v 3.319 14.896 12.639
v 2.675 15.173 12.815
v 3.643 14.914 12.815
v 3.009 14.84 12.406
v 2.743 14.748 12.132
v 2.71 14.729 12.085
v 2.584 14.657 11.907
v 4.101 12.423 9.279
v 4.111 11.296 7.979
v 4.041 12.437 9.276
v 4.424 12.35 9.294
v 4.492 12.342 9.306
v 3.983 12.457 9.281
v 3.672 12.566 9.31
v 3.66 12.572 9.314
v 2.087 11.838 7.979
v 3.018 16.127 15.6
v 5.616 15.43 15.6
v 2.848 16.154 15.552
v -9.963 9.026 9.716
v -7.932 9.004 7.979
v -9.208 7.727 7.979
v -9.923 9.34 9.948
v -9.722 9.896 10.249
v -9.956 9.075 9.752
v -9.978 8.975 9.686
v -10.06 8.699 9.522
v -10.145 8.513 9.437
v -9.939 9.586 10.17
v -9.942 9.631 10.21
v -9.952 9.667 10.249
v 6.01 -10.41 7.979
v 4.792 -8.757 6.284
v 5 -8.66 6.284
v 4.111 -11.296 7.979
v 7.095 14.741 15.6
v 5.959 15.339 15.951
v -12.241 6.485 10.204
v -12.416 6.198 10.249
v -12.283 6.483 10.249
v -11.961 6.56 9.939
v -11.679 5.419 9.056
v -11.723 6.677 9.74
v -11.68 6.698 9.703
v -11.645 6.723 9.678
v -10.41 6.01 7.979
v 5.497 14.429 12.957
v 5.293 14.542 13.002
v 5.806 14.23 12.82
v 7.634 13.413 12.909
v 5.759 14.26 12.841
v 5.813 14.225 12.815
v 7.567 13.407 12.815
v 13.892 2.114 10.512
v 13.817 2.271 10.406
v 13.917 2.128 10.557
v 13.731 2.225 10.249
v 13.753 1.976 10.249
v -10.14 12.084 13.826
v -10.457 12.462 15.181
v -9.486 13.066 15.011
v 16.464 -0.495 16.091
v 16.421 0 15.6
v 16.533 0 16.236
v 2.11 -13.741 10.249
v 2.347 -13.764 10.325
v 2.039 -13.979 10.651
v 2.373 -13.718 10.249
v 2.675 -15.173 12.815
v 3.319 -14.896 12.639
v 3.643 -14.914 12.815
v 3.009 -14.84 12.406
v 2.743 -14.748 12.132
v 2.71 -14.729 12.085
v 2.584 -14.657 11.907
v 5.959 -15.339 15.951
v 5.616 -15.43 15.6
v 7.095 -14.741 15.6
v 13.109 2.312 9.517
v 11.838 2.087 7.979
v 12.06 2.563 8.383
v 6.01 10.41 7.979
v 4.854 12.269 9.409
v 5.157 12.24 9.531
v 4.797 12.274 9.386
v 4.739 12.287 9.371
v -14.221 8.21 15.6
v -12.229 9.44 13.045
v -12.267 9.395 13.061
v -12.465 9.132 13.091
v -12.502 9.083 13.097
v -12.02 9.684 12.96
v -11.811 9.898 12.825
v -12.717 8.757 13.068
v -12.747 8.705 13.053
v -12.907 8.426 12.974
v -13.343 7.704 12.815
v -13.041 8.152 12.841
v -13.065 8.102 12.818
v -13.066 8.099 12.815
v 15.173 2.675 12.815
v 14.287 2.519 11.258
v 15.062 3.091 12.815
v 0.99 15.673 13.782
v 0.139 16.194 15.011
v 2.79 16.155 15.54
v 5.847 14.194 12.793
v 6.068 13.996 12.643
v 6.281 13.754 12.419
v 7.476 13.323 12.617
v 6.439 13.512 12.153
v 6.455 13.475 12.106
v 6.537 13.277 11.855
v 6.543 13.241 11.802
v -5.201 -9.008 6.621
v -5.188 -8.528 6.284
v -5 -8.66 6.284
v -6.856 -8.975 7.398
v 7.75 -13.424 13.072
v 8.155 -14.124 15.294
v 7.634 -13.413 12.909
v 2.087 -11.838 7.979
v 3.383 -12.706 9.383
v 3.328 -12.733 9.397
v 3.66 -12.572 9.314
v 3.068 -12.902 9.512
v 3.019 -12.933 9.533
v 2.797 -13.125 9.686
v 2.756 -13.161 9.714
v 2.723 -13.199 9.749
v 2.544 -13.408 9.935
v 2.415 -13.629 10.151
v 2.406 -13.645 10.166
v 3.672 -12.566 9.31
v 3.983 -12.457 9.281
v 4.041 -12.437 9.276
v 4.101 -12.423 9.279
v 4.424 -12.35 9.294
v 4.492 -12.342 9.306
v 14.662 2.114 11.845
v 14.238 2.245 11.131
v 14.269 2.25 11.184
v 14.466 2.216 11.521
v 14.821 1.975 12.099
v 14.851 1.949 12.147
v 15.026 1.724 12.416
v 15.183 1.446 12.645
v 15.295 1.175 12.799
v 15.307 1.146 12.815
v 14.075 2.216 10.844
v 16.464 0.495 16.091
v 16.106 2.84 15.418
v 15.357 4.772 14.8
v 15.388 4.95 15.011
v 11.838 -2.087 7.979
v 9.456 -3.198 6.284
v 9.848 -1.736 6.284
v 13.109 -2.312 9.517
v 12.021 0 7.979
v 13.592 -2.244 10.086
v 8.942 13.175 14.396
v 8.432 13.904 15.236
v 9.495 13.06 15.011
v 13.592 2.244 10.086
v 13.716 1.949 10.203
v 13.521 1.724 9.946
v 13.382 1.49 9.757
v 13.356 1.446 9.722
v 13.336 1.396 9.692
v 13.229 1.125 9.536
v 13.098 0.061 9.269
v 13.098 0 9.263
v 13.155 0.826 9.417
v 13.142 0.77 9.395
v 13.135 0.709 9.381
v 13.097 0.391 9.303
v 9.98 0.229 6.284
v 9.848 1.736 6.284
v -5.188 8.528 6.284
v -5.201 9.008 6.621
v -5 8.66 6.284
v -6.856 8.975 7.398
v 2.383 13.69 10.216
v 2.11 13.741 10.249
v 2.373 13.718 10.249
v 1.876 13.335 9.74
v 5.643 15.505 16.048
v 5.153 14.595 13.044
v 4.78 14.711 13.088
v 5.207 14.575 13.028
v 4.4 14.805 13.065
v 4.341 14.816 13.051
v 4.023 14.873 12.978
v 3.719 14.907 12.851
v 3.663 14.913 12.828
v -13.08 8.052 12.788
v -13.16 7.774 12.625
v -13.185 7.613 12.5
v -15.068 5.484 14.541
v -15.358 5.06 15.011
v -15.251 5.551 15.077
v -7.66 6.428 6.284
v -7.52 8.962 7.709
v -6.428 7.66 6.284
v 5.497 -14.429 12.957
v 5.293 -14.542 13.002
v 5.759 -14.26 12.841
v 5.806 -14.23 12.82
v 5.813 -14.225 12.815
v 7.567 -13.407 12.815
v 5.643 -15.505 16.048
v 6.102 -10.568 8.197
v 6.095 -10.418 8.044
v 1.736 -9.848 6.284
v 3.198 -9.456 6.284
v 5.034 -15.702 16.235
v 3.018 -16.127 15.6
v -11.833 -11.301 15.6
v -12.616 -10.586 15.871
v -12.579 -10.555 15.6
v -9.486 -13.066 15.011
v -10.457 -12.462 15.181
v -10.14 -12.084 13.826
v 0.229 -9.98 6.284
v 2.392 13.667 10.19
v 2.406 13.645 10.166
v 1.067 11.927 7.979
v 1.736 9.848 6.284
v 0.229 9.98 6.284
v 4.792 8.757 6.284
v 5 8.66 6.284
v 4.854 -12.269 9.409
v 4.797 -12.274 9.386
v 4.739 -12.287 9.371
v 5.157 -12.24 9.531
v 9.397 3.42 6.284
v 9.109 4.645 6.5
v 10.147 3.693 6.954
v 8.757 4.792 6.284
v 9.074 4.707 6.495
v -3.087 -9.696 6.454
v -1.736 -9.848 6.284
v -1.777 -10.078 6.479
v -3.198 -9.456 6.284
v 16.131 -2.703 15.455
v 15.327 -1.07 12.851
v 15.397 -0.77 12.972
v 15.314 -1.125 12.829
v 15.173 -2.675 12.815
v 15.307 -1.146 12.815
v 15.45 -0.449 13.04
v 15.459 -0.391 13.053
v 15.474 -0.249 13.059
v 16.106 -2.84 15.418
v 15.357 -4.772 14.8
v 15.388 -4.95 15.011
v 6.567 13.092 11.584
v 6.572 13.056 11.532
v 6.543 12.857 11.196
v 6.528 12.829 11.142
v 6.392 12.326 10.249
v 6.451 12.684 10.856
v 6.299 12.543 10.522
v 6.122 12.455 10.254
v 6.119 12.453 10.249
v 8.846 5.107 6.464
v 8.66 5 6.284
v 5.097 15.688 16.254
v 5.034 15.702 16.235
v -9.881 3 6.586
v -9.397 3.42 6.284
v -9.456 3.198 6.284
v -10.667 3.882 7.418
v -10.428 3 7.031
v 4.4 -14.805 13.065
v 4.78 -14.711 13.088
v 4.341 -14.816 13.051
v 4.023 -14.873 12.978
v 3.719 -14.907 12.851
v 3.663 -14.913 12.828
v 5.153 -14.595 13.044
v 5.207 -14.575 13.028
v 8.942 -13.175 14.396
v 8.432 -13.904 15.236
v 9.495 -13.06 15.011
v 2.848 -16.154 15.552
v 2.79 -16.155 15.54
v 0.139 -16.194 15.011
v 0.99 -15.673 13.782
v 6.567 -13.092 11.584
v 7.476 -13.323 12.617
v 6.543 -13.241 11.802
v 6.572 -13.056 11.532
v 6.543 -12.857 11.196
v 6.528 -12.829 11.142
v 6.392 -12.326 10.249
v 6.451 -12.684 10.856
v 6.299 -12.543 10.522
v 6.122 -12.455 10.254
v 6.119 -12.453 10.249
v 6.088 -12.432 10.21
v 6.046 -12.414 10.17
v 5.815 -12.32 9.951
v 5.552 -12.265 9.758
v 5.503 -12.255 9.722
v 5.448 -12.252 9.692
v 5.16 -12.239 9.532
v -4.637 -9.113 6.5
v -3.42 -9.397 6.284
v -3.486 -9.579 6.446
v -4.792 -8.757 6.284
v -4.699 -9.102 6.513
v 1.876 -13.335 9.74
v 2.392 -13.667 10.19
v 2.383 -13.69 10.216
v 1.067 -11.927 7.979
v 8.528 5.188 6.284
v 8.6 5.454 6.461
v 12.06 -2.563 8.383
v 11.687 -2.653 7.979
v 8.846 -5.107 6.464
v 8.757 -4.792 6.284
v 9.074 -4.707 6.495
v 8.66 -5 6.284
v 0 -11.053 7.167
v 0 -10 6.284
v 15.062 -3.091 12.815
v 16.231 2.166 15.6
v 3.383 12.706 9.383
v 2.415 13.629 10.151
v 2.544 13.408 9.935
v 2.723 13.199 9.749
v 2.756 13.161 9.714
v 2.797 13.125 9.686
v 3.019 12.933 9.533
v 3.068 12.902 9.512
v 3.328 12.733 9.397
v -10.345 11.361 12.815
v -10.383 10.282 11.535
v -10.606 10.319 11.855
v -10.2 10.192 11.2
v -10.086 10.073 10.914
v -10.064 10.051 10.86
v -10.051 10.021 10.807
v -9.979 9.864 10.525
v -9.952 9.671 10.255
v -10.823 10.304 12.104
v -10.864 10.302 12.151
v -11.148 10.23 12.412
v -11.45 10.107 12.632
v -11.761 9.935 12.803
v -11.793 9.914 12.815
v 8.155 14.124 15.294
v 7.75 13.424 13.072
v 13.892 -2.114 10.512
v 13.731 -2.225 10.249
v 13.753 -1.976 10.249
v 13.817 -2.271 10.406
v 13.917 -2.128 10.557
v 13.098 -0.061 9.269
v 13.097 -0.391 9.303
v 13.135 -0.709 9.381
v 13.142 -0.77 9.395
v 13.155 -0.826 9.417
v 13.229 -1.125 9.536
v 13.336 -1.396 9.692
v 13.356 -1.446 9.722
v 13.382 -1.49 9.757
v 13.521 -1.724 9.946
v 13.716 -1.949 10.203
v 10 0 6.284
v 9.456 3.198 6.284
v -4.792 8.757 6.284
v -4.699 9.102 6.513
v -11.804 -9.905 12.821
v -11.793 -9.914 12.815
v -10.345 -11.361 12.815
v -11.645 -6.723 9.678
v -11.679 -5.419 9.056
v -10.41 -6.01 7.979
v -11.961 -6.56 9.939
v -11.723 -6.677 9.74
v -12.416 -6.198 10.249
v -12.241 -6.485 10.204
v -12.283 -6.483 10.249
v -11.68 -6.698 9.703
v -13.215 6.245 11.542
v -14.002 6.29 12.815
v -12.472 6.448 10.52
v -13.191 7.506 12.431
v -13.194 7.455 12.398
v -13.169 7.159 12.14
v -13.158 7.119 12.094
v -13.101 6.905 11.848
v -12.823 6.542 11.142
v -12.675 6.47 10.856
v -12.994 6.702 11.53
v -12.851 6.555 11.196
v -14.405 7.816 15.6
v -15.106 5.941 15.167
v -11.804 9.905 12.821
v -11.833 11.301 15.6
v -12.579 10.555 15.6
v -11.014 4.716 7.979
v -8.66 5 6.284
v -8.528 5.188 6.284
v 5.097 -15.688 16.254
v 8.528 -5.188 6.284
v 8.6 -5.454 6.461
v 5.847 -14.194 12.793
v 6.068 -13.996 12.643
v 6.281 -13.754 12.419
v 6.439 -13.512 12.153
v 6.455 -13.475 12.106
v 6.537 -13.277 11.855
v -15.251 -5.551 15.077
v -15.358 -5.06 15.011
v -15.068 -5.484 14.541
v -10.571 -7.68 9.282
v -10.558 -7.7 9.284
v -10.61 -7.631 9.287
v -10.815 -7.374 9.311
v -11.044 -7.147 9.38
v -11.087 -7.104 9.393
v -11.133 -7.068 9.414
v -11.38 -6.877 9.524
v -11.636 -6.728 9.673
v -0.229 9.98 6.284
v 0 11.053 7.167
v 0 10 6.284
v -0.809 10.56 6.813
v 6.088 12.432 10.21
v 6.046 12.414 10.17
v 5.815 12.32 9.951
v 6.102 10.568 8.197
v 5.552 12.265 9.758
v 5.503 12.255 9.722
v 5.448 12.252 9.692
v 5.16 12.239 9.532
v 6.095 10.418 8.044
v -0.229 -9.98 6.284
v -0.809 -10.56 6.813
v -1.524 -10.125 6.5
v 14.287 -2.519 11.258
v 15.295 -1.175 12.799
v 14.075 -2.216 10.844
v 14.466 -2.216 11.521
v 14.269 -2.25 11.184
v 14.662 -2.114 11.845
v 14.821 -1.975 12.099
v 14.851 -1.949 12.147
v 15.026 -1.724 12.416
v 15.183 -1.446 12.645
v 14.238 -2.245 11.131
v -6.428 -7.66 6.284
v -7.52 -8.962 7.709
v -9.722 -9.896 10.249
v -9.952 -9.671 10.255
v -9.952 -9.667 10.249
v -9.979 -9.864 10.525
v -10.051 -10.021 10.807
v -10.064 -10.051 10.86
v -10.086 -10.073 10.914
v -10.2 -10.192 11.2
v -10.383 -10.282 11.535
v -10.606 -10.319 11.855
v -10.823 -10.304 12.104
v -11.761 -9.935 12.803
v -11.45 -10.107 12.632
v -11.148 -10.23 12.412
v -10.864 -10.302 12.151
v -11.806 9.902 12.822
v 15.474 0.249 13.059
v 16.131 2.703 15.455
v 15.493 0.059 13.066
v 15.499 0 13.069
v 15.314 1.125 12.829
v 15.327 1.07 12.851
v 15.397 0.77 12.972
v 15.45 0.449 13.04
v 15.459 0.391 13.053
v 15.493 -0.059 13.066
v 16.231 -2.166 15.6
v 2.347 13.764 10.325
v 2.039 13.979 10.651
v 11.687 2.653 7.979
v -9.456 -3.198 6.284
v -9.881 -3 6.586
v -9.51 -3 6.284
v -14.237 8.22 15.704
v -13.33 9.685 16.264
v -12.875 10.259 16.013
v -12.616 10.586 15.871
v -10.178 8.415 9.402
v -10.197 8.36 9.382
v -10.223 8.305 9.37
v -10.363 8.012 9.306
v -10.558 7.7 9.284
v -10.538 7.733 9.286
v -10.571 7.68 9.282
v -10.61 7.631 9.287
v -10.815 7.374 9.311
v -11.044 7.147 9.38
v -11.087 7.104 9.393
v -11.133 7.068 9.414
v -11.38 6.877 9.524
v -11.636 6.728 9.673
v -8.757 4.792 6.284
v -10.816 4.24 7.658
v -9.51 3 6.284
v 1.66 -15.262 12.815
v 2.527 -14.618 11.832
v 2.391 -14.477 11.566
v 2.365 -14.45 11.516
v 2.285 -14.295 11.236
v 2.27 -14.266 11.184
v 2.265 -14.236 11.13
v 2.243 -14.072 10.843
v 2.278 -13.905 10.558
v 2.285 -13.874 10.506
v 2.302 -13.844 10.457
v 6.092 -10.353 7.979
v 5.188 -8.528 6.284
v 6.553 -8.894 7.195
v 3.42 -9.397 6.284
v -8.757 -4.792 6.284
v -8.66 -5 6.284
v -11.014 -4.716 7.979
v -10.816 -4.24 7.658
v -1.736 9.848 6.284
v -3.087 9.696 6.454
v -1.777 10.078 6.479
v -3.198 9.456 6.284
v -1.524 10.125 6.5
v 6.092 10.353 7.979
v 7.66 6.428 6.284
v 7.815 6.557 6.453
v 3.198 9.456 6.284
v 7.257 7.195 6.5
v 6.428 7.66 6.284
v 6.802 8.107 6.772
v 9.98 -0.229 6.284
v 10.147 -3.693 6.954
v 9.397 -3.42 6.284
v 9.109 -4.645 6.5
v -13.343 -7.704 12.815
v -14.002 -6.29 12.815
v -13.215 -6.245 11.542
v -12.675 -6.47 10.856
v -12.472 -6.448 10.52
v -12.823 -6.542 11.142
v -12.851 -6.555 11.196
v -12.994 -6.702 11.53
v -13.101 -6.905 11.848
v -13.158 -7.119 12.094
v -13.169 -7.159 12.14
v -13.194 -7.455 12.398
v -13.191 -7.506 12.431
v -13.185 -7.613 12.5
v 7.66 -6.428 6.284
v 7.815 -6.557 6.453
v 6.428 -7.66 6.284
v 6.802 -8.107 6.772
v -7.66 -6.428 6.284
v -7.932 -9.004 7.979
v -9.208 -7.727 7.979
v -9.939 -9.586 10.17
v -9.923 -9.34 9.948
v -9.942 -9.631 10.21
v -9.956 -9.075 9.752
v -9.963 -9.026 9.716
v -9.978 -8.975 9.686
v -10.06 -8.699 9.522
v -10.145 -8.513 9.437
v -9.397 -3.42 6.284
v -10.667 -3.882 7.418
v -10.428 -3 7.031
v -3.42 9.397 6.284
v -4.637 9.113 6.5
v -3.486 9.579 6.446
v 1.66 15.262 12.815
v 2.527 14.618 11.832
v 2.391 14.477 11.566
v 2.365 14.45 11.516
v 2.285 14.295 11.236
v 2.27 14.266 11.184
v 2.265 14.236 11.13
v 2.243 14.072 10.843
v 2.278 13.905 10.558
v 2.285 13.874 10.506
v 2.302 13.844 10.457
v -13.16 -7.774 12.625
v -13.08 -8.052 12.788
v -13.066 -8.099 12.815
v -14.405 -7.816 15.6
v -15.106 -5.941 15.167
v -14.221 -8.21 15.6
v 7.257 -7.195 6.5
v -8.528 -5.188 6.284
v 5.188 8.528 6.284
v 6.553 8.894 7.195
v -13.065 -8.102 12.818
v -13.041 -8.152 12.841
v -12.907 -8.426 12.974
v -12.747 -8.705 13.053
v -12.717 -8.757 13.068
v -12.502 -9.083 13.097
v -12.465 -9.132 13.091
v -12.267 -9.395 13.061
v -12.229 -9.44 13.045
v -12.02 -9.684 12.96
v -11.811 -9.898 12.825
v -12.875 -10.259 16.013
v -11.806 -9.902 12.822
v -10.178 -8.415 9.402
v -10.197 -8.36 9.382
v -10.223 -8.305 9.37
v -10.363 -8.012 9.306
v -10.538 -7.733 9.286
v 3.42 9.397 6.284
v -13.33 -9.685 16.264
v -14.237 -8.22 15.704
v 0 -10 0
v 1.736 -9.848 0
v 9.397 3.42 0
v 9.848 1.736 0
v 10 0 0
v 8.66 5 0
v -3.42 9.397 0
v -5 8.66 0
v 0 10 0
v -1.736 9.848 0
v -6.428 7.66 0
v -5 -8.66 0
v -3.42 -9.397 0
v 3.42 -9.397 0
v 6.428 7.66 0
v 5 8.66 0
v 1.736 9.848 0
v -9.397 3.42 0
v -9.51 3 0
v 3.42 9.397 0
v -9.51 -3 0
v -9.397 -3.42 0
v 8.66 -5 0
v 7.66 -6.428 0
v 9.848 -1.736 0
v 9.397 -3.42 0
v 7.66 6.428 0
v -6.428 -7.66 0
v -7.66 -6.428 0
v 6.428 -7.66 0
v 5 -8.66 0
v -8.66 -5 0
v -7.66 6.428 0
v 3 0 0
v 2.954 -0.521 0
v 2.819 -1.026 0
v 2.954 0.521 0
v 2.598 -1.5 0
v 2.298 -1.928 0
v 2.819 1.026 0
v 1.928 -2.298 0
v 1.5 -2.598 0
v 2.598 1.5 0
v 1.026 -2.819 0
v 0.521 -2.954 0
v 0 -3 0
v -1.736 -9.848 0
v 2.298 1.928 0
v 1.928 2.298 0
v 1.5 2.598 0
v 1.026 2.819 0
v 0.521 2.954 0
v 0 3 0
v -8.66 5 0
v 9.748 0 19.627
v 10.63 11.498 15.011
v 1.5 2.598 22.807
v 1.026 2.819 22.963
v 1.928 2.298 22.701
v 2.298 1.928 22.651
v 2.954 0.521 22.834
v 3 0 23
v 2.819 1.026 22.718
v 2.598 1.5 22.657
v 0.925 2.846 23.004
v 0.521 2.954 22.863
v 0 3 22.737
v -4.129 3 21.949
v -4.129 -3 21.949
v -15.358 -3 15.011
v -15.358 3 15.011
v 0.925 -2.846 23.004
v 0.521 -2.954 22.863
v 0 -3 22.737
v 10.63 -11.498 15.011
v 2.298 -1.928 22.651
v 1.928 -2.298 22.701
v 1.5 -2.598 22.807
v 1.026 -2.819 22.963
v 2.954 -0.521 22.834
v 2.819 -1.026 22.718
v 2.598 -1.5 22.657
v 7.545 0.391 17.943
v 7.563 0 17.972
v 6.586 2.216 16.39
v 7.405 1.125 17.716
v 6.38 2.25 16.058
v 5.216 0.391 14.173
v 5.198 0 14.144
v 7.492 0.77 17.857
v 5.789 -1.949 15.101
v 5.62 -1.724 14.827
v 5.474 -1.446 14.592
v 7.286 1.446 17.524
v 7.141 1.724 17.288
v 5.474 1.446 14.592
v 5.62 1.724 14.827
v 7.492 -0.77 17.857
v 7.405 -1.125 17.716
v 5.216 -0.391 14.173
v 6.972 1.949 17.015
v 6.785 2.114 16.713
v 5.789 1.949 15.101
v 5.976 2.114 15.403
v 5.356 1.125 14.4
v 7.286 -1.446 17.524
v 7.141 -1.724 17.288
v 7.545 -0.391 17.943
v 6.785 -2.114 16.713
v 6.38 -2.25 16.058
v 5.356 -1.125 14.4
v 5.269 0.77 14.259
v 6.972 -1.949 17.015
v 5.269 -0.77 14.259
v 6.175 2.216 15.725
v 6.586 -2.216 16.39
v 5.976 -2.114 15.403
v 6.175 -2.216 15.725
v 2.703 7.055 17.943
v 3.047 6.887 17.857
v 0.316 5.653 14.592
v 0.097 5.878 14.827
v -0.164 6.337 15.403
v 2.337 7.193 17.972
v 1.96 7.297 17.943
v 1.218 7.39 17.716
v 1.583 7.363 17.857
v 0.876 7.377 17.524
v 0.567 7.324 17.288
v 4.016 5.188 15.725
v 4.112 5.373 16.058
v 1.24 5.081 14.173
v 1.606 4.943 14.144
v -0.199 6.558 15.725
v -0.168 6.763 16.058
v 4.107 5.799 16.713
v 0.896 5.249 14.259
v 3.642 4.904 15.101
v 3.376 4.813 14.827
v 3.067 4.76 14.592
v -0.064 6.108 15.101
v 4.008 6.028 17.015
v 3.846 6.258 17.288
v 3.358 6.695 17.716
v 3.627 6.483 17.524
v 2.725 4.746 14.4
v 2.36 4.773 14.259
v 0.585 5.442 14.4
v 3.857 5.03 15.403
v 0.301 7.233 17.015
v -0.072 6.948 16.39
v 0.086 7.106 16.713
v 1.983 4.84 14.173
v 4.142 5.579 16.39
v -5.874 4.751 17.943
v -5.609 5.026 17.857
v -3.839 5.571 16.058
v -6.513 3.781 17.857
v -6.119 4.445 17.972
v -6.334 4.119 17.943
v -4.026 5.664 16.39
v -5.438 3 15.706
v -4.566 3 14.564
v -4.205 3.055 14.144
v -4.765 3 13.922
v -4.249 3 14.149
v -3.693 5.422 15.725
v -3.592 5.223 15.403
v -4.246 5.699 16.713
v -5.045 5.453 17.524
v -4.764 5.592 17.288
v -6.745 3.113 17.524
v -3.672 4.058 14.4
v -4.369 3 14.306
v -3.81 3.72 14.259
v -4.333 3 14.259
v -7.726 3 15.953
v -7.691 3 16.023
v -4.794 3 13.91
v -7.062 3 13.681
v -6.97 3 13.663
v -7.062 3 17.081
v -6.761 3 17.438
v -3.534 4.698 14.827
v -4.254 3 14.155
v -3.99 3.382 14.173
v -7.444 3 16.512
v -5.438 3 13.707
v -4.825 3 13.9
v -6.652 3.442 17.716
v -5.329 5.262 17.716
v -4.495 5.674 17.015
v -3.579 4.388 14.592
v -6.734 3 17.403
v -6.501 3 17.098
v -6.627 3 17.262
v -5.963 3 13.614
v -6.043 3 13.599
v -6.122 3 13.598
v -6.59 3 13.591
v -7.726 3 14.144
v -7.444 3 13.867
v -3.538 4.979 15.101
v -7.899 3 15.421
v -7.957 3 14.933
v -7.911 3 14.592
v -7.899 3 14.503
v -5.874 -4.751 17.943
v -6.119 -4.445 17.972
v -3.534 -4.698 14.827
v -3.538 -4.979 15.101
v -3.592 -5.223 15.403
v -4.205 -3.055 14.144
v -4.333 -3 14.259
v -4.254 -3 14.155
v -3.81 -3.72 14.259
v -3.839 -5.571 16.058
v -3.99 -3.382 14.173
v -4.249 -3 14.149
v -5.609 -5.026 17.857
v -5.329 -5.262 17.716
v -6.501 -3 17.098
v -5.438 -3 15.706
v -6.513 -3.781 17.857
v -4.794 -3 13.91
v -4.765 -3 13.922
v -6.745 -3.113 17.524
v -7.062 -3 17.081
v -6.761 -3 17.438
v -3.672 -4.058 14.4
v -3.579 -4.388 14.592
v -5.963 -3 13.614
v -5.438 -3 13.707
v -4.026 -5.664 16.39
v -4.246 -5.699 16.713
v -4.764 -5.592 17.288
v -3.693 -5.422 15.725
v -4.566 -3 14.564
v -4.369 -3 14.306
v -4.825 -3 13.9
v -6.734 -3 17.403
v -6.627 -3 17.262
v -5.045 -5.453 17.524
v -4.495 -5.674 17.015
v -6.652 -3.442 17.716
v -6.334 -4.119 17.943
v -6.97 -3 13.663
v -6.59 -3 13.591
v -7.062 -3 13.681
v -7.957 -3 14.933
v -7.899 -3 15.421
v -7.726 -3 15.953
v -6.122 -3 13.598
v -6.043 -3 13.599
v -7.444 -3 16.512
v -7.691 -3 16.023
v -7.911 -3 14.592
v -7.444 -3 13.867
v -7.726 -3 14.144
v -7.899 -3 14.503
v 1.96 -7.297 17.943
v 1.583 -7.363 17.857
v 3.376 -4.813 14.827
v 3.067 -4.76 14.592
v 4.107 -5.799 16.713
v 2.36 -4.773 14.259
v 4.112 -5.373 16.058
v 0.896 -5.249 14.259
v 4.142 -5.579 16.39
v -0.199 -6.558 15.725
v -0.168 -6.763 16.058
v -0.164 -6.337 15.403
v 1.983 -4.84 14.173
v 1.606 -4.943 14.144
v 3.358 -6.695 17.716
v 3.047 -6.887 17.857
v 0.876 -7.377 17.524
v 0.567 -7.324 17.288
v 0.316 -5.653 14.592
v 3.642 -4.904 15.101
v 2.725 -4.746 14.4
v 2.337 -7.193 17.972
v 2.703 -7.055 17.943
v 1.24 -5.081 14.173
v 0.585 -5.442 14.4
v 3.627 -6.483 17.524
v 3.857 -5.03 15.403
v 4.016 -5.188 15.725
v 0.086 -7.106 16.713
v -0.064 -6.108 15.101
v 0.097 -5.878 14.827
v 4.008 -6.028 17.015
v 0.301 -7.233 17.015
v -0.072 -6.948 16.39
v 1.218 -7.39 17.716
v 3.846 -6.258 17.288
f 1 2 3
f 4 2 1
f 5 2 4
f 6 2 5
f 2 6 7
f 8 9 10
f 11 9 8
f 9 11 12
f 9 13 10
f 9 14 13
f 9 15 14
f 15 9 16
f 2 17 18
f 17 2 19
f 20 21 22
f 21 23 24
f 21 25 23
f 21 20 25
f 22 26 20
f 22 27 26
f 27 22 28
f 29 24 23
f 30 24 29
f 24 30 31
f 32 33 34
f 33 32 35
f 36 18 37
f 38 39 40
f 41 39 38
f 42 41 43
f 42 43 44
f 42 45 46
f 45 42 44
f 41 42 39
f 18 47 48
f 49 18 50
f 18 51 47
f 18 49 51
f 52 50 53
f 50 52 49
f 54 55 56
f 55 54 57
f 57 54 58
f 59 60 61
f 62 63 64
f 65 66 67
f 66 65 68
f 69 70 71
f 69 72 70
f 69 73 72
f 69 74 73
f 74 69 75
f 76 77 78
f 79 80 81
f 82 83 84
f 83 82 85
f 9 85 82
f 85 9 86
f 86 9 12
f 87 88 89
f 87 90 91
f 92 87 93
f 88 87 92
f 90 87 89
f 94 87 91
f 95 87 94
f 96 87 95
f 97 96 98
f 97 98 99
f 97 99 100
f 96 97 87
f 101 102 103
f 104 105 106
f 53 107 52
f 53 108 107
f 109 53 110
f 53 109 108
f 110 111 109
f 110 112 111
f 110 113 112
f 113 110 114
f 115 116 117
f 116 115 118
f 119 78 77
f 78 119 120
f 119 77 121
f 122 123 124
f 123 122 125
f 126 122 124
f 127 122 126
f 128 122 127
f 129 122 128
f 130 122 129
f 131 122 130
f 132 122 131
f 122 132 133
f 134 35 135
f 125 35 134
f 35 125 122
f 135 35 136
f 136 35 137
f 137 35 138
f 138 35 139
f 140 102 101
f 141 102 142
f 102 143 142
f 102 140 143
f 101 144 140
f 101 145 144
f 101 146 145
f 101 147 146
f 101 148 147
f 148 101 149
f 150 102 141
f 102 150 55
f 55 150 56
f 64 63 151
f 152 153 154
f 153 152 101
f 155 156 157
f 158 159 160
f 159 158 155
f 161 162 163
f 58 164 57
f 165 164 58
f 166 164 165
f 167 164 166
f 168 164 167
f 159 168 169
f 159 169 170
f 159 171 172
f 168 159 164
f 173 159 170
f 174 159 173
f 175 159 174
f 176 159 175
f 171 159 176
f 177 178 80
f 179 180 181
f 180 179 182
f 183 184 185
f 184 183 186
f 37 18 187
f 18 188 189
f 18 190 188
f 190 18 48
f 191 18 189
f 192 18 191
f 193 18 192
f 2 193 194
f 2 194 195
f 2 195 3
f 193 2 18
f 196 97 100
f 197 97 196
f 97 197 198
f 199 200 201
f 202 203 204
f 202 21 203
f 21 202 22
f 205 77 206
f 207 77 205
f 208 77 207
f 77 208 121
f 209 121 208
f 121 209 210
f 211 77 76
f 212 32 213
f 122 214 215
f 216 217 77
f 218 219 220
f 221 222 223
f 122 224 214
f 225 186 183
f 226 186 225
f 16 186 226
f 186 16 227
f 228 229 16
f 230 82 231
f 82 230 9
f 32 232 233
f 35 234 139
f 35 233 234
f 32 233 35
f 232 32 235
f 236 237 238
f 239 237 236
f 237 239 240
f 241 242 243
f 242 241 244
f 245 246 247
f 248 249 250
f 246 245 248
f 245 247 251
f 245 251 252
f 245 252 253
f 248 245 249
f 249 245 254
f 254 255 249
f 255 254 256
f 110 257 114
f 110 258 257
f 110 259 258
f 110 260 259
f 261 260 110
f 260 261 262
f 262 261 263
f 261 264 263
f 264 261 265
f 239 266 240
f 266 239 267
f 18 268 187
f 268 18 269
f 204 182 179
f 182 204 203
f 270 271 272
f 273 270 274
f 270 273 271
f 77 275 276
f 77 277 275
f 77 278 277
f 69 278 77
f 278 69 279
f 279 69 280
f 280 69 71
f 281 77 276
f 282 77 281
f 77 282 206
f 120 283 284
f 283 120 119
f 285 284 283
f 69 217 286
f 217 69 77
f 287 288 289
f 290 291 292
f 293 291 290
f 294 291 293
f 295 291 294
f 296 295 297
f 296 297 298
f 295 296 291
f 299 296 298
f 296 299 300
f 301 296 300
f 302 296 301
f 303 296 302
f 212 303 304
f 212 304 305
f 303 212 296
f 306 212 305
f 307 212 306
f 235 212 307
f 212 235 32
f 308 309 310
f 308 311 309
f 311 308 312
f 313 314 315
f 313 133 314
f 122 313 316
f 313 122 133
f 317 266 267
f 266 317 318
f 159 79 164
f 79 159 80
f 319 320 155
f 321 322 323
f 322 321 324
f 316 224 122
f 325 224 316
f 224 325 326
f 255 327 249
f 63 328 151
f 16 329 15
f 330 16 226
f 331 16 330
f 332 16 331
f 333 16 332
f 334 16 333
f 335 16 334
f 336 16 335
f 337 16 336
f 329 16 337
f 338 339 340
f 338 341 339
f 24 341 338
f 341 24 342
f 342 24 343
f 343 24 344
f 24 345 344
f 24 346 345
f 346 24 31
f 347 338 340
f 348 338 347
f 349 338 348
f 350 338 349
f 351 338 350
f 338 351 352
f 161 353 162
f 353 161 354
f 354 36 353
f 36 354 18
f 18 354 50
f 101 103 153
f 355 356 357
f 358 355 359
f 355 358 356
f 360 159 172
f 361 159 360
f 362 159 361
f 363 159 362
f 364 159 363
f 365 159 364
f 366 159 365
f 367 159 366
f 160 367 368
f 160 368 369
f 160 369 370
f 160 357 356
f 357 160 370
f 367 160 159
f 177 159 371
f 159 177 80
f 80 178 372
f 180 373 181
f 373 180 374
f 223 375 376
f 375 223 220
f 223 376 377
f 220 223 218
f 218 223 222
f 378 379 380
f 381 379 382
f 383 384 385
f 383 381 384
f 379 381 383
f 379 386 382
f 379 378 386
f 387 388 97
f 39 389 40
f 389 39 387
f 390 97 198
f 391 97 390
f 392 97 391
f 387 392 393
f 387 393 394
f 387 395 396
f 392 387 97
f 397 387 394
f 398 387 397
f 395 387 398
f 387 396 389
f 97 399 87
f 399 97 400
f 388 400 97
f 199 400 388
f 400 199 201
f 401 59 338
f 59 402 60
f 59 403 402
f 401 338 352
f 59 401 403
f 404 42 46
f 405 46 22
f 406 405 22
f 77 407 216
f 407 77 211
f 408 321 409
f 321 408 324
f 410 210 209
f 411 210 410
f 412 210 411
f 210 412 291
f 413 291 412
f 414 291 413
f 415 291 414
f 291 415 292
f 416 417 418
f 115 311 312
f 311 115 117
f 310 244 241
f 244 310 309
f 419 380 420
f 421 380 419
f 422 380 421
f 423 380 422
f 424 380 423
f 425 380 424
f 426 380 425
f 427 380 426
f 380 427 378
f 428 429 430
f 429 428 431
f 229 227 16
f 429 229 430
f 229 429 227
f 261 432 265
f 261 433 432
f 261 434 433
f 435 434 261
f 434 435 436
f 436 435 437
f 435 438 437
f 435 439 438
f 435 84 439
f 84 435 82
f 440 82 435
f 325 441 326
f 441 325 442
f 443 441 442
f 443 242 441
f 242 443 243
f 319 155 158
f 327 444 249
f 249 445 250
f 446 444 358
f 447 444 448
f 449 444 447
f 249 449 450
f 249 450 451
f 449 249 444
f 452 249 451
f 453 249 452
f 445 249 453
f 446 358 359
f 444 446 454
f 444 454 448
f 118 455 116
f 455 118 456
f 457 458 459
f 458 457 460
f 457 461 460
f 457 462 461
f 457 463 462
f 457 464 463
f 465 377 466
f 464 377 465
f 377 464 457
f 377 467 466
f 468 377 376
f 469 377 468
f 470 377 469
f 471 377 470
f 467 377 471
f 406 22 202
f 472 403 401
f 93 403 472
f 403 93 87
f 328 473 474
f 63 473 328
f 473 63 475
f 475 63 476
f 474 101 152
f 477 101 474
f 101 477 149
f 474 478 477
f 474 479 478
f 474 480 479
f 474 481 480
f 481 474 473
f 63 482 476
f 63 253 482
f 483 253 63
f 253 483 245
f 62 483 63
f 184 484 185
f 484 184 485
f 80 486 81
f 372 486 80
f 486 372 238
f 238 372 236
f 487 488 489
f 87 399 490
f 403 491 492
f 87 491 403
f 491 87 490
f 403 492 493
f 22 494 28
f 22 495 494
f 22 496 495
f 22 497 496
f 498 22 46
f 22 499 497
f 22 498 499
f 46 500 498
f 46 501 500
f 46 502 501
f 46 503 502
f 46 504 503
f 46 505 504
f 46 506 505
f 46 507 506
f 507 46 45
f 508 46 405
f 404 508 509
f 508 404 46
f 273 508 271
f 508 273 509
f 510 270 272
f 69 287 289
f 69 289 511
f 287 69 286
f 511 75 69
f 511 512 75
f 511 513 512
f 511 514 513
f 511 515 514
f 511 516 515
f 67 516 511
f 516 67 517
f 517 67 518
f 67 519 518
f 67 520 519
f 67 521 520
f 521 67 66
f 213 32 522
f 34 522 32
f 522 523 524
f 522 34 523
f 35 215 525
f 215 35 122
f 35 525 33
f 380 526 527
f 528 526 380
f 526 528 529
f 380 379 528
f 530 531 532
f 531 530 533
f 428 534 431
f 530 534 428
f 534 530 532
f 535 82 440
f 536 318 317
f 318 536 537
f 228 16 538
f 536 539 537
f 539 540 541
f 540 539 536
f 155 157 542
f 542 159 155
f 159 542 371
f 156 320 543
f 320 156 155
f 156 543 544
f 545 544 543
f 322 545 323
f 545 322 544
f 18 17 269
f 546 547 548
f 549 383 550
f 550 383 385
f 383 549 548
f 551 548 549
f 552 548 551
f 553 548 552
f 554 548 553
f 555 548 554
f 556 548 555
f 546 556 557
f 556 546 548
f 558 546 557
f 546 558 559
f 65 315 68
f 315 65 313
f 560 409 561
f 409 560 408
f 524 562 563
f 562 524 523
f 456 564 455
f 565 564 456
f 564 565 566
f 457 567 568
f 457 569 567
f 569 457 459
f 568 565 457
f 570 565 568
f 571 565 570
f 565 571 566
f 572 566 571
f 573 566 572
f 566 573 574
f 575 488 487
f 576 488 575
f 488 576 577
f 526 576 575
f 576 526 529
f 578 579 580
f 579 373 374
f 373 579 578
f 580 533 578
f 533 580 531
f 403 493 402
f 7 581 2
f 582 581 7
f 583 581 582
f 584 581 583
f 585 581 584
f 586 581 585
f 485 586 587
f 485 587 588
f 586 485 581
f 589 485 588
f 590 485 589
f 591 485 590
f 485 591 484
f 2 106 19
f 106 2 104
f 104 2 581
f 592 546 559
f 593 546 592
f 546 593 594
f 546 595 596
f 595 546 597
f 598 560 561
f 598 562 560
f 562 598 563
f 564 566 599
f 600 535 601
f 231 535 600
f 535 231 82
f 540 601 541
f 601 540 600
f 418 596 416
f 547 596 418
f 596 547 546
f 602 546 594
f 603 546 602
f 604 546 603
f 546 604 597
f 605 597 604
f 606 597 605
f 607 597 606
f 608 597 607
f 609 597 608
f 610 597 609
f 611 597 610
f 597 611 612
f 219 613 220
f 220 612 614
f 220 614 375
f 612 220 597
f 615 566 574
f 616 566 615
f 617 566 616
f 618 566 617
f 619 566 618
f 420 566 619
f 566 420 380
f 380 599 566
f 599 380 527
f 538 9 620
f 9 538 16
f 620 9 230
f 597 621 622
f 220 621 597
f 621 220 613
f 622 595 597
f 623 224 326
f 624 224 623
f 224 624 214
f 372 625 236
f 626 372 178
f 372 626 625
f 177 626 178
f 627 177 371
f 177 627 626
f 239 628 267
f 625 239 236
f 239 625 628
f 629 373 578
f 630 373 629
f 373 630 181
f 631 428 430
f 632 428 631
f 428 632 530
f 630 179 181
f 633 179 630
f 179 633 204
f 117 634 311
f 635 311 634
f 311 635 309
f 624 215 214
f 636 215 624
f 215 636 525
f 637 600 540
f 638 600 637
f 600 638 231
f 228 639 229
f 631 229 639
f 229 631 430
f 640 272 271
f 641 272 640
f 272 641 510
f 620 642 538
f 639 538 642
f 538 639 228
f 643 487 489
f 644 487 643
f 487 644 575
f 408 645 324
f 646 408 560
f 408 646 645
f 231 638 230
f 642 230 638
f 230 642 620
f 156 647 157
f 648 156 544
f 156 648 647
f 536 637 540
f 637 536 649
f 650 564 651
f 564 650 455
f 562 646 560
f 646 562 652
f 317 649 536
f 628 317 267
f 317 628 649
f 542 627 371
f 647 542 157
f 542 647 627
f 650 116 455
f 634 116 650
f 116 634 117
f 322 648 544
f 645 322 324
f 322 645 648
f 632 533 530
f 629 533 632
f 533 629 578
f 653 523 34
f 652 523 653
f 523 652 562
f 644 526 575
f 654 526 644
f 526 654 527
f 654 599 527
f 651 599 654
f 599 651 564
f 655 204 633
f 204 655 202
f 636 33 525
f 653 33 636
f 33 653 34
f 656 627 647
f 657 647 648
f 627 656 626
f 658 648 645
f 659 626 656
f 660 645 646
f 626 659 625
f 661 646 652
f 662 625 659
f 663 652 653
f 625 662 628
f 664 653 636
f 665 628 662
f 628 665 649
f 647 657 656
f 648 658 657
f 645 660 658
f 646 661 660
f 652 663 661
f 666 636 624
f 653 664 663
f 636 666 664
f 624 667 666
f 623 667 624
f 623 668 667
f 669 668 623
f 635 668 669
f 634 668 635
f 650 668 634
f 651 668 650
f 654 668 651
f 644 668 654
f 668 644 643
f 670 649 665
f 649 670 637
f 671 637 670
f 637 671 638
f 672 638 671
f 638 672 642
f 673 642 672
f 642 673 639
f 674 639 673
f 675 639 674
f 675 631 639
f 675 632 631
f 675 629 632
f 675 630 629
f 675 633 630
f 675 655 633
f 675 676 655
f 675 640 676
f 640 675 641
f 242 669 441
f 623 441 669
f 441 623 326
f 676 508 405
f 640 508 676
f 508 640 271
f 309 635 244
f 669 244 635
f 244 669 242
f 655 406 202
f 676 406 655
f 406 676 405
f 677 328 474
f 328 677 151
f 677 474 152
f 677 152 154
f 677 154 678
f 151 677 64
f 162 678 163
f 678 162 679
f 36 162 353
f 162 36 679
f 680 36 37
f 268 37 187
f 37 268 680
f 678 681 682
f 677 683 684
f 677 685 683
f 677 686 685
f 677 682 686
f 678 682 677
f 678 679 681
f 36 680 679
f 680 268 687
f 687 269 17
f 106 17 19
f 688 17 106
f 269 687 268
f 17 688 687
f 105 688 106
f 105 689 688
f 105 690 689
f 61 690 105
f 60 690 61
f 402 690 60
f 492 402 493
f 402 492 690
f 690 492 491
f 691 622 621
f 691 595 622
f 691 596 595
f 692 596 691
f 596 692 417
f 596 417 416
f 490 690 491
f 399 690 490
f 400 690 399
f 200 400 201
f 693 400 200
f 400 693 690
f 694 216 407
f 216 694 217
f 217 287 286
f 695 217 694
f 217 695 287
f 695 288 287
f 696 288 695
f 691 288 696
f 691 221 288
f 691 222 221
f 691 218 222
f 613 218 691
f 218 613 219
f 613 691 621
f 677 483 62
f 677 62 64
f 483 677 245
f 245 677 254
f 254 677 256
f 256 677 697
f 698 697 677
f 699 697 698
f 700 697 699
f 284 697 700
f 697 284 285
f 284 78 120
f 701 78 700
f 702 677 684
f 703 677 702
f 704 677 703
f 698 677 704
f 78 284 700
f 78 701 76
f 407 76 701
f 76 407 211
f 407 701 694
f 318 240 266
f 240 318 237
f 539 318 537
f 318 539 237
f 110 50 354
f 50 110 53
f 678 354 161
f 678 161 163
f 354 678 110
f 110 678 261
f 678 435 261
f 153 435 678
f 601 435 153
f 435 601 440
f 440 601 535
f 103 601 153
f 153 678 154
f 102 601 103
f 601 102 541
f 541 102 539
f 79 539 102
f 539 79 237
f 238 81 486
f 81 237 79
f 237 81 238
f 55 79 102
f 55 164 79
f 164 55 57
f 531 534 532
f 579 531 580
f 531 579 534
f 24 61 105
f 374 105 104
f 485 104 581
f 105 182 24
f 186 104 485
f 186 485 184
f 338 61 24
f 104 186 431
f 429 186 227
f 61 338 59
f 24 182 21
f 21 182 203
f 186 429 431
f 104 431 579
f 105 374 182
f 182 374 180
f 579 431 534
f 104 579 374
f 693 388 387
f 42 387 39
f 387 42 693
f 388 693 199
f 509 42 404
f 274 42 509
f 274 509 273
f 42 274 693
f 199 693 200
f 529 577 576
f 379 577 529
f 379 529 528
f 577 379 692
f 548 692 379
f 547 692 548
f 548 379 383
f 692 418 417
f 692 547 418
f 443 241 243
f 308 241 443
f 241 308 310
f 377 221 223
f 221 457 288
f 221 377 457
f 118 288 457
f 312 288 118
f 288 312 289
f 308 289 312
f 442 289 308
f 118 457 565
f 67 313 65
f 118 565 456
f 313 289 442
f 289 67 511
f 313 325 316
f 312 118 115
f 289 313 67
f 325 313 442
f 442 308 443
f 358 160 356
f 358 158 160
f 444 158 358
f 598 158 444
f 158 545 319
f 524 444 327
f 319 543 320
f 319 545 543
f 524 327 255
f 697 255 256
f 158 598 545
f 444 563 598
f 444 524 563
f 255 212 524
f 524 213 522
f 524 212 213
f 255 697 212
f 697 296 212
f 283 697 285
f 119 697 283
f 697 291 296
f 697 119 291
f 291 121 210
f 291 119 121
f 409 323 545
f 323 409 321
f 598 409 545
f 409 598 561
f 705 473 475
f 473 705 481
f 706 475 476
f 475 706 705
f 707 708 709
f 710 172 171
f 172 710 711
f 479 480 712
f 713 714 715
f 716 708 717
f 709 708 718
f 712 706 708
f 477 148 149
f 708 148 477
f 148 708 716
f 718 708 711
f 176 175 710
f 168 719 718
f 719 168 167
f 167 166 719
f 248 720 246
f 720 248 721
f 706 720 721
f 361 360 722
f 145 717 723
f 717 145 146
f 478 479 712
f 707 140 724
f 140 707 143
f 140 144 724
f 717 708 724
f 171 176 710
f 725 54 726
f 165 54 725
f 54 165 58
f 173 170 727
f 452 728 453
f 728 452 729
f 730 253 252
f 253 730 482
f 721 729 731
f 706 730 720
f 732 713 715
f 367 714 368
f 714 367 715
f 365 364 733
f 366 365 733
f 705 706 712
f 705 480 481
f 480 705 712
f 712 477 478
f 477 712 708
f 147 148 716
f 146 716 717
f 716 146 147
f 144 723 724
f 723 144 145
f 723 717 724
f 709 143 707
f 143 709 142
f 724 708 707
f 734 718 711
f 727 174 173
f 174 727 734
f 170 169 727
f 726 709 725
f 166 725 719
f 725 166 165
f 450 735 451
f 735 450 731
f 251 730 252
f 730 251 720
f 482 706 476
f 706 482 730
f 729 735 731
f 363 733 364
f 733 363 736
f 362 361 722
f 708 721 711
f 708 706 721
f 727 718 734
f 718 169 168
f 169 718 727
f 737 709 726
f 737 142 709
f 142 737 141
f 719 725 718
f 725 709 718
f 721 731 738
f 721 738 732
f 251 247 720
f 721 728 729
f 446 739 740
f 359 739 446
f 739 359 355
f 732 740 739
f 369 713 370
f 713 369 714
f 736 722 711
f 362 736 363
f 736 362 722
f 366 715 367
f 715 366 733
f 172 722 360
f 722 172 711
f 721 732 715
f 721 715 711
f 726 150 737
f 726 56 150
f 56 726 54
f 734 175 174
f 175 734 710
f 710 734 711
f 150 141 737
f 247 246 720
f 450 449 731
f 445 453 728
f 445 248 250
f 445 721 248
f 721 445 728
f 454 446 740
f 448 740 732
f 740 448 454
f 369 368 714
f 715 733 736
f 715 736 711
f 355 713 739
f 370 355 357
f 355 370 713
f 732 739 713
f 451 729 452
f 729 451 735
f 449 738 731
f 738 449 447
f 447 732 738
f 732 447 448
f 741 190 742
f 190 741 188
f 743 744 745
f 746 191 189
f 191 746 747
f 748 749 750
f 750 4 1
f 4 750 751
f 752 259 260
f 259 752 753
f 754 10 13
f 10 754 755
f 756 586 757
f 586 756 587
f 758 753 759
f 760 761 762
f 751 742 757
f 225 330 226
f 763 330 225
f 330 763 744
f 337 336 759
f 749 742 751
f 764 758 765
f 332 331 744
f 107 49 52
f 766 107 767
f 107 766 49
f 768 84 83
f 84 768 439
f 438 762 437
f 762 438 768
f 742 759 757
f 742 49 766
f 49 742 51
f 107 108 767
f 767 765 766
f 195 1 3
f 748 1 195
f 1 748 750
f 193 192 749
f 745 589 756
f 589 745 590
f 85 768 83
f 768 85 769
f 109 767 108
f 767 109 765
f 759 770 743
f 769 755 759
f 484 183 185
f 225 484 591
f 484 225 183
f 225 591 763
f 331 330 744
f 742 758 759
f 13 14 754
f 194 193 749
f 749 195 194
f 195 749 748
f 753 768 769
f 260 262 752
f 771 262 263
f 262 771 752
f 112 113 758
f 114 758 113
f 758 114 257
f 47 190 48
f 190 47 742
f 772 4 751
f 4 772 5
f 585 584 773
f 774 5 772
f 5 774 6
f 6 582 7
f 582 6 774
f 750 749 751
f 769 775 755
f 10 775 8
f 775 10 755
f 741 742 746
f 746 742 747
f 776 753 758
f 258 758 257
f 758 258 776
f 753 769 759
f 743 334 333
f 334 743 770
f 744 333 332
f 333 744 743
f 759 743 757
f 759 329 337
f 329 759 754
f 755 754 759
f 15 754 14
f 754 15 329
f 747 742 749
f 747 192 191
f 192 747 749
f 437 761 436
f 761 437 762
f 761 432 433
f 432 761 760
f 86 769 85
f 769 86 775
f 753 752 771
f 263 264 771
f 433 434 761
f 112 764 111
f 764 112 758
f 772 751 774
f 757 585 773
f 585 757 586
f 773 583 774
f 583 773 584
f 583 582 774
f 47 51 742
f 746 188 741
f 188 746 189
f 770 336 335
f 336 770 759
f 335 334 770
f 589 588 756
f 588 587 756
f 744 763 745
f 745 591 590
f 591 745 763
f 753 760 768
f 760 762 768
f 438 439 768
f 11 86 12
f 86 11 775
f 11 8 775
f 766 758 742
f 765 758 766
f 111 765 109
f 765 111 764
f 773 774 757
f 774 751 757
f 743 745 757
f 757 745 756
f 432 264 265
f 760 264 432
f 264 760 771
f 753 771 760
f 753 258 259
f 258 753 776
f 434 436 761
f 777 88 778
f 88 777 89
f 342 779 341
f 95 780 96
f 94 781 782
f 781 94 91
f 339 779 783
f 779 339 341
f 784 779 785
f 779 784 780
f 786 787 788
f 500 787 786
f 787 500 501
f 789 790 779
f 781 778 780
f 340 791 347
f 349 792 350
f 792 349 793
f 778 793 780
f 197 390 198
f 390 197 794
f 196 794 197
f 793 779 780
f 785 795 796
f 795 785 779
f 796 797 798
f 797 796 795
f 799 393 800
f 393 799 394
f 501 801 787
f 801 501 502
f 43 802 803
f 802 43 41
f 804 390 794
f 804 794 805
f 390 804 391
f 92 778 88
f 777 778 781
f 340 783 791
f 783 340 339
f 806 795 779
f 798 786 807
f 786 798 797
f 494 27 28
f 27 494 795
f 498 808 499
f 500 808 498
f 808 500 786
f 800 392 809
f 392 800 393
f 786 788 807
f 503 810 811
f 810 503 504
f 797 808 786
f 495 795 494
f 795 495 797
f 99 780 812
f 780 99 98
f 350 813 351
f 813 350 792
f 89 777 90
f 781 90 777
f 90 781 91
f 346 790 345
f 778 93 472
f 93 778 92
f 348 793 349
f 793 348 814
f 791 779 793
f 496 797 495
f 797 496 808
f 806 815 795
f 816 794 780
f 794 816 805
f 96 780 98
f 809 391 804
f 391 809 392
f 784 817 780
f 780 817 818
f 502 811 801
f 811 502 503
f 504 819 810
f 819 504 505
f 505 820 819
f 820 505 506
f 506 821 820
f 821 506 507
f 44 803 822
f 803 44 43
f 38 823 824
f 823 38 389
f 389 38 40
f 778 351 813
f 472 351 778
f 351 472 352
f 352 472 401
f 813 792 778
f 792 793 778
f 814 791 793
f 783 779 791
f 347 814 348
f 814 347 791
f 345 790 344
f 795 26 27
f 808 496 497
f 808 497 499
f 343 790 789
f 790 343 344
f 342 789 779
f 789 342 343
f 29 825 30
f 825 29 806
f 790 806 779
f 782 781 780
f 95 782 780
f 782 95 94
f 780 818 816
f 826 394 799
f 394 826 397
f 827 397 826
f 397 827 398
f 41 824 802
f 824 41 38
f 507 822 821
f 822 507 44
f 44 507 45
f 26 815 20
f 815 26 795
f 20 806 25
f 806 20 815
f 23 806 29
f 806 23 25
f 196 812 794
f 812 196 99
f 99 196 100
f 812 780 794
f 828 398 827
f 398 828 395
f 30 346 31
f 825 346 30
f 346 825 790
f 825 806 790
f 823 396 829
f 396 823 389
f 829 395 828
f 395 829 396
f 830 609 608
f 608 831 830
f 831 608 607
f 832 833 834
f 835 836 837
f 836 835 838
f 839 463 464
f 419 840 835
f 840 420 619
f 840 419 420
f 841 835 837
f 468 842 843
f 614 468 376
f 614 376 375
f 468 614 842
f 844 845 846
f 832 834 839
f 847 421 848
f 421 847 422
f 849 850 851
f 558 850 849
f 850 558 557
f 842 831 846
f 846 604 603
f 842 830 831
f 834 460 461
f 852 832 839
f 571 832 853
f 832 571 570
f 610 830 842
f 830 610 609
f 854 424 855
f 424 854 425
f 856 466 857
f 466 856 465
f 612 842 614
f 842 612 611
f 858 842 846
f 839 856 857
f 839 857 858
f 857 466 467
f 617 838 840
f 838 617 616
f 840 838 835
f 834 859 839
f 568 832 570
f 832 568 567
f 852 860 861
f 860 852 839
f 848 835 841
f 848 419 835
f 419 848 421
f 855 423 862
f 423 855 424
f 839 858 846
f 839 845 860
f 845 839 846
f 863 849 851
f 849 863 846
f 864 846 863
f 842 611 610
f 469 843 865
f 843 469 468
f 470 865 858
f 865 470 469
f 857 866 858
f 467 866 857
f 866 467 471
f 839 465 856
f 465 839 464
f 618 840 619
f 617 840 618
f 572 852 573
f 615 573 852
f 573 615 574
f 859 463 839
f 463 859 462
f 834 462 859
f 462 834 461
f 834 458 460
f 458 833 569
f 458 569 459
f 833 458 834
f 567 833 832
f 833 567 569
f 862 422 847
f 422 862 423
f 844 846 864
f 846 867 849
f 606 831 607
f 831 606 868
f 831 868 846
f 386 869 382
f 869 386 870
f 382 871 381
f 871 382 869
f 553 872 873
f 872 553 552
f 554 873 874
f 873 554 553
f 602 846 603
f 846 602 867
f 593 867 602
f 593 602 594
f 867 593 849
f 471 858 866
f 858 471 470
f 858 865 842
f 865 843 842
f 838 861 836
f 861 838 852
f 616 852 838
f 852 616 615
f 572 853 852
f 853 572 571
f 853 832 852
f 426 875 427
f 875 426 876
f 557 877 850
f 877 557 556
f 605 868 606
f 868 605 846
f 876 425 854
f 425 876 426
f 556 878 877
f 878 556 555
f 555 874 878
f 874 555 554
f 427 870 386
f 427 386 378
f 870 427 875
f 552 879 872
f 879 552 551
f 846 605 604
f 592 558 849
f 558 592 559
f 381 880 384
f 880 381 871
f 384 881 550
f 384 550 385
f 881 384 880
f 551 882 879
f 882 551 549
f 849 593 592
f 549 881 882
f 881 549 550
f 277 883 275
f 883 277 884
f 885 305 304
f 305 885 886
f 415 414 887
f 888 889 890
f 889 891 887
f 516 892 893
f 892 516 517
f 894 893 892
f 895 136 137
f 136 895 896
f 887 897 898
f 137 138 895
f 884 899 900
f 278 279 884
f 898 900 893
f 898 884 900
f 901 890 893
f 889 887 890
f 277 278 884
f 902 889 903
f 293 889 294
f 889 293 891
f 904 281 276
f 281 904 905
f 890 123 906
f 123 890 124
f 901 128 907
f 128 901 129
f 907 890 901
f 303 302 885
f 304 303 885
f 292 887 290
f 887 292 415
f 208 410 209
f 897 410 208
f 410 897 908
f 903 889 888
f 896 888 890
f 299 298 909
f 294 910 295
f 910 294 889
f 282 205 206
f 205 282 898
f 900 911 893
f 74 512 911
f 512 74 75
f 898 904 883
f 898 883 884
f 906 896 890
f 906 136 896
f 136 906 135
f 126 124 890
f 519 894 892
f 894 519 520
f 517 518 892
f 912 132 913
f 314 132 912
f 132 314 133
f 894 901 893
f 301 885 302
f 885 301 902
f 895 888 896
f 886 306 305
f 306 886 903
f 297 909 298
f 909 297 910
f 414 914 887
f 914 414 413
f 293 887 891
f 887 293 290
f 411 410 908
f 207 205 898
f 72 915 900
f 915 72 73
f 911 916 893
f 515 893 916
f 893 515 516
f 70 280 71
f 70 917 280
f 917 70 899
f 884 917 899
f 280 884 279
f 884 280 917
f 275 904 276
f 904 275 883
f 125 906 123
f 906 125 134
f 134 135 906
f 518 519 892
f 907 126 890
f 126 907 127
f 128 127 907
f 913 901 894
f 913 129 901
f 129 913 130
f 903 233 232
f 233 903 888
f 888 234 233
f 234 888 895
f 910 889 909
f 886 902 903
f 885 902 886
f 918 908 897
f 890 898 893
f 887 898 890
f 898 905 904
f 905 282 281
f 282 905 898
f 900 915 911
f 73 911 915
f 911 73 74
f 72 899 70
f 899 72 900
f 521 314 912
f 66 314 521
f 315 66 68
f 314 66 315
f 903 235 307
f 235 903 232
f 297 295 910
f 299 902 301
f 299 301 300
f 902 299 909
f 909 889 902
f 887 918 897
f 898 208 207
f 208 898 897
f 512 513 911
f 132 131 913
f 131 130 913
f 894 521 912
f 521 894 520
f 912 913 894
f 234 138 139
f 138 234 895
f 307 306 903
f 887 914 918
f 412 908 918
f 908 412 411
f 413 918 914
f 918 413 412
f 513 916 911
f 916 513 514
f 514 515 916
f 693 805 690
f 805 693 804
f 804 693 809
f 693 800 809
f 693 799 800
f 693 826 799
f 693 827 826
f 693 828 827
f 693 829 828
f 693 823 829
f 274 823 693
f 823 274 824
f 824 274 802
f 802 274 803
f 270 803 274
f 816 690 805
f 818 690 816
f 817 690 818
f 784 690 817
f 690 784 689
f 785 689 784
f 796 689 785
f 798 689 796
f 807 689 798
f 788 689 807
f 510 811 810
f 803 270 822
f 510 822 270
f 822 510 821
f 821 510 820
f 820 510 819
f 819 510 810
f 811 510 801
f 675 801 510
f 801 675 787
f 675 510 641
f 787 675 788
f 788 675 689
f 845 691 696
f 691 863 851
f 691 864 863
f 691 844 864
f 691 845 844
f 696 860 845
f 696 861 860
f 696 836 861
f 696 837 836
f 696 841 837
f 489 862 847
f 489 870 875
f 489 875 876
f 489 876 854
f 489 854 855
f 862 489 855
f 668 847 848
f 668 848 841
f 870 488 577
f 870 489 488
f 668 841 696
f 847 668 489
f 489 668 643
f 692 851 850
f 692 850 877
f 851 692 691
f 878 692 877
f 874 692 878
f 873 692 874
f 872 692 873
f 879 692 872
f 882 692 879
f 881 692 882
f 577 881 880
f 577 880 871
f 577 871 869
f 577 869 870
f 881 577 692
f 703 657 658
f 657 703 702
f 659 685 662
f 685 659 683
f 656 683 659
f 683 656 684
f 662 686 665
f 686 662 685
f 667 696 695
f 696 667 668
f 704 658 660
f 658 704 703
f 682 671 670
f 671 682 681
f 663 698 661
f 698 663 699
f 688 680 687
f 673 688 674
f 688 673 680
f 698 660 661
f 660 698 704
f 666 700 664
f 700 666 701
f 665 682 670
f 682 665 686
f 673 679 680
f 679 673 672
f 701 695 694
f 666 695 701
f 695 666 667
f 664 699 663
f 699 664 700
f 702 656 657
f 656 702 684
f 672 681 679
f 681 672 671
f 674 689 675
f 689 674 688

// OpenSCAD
$fn=36;


hole_r = 2.25;


module holes()
{
	for (a = [0:4]) 
	{
		rotate([0,-(90-31.71),a*72]) translate([0,0,-18.5]) cylinder(11, hole_r, hole_r);
	}
}

c=30;

module icosahedron_connector(){

	difference()
	{
		union()
		{
			sphere(17);
			translate([0,0,-20]) cylinder(10,10,10);
		}

		translate([-15,0,0]) cube([30,6,45],center=true);

		cylinder(45,3,3, center=true);
		
		// top cutaway
		for (a = [0:4])
		{
			rotate([0, 0, 36+(a*72)]) translate([0, -c/2, 4.5]) rotate([0,31.71,0]) cube(c);
		}
		translate([0,0,18.5]) cube(c, center=true);
	
		//side cutaway
		for (a = [0:4])
		{
			rotate([0, 0, 36+(a*72)]) translate([10.1, -c/2, -13.5]) rotate([0,31.71,0]) cube(c);
		}
		
		//bottom cutaway
		translate([0,0,-36]) cube(c, center=true);
	
		// holes
		holes();
	}
}

translate([0,0,20]) // was 11
	icosahedron_connector();
